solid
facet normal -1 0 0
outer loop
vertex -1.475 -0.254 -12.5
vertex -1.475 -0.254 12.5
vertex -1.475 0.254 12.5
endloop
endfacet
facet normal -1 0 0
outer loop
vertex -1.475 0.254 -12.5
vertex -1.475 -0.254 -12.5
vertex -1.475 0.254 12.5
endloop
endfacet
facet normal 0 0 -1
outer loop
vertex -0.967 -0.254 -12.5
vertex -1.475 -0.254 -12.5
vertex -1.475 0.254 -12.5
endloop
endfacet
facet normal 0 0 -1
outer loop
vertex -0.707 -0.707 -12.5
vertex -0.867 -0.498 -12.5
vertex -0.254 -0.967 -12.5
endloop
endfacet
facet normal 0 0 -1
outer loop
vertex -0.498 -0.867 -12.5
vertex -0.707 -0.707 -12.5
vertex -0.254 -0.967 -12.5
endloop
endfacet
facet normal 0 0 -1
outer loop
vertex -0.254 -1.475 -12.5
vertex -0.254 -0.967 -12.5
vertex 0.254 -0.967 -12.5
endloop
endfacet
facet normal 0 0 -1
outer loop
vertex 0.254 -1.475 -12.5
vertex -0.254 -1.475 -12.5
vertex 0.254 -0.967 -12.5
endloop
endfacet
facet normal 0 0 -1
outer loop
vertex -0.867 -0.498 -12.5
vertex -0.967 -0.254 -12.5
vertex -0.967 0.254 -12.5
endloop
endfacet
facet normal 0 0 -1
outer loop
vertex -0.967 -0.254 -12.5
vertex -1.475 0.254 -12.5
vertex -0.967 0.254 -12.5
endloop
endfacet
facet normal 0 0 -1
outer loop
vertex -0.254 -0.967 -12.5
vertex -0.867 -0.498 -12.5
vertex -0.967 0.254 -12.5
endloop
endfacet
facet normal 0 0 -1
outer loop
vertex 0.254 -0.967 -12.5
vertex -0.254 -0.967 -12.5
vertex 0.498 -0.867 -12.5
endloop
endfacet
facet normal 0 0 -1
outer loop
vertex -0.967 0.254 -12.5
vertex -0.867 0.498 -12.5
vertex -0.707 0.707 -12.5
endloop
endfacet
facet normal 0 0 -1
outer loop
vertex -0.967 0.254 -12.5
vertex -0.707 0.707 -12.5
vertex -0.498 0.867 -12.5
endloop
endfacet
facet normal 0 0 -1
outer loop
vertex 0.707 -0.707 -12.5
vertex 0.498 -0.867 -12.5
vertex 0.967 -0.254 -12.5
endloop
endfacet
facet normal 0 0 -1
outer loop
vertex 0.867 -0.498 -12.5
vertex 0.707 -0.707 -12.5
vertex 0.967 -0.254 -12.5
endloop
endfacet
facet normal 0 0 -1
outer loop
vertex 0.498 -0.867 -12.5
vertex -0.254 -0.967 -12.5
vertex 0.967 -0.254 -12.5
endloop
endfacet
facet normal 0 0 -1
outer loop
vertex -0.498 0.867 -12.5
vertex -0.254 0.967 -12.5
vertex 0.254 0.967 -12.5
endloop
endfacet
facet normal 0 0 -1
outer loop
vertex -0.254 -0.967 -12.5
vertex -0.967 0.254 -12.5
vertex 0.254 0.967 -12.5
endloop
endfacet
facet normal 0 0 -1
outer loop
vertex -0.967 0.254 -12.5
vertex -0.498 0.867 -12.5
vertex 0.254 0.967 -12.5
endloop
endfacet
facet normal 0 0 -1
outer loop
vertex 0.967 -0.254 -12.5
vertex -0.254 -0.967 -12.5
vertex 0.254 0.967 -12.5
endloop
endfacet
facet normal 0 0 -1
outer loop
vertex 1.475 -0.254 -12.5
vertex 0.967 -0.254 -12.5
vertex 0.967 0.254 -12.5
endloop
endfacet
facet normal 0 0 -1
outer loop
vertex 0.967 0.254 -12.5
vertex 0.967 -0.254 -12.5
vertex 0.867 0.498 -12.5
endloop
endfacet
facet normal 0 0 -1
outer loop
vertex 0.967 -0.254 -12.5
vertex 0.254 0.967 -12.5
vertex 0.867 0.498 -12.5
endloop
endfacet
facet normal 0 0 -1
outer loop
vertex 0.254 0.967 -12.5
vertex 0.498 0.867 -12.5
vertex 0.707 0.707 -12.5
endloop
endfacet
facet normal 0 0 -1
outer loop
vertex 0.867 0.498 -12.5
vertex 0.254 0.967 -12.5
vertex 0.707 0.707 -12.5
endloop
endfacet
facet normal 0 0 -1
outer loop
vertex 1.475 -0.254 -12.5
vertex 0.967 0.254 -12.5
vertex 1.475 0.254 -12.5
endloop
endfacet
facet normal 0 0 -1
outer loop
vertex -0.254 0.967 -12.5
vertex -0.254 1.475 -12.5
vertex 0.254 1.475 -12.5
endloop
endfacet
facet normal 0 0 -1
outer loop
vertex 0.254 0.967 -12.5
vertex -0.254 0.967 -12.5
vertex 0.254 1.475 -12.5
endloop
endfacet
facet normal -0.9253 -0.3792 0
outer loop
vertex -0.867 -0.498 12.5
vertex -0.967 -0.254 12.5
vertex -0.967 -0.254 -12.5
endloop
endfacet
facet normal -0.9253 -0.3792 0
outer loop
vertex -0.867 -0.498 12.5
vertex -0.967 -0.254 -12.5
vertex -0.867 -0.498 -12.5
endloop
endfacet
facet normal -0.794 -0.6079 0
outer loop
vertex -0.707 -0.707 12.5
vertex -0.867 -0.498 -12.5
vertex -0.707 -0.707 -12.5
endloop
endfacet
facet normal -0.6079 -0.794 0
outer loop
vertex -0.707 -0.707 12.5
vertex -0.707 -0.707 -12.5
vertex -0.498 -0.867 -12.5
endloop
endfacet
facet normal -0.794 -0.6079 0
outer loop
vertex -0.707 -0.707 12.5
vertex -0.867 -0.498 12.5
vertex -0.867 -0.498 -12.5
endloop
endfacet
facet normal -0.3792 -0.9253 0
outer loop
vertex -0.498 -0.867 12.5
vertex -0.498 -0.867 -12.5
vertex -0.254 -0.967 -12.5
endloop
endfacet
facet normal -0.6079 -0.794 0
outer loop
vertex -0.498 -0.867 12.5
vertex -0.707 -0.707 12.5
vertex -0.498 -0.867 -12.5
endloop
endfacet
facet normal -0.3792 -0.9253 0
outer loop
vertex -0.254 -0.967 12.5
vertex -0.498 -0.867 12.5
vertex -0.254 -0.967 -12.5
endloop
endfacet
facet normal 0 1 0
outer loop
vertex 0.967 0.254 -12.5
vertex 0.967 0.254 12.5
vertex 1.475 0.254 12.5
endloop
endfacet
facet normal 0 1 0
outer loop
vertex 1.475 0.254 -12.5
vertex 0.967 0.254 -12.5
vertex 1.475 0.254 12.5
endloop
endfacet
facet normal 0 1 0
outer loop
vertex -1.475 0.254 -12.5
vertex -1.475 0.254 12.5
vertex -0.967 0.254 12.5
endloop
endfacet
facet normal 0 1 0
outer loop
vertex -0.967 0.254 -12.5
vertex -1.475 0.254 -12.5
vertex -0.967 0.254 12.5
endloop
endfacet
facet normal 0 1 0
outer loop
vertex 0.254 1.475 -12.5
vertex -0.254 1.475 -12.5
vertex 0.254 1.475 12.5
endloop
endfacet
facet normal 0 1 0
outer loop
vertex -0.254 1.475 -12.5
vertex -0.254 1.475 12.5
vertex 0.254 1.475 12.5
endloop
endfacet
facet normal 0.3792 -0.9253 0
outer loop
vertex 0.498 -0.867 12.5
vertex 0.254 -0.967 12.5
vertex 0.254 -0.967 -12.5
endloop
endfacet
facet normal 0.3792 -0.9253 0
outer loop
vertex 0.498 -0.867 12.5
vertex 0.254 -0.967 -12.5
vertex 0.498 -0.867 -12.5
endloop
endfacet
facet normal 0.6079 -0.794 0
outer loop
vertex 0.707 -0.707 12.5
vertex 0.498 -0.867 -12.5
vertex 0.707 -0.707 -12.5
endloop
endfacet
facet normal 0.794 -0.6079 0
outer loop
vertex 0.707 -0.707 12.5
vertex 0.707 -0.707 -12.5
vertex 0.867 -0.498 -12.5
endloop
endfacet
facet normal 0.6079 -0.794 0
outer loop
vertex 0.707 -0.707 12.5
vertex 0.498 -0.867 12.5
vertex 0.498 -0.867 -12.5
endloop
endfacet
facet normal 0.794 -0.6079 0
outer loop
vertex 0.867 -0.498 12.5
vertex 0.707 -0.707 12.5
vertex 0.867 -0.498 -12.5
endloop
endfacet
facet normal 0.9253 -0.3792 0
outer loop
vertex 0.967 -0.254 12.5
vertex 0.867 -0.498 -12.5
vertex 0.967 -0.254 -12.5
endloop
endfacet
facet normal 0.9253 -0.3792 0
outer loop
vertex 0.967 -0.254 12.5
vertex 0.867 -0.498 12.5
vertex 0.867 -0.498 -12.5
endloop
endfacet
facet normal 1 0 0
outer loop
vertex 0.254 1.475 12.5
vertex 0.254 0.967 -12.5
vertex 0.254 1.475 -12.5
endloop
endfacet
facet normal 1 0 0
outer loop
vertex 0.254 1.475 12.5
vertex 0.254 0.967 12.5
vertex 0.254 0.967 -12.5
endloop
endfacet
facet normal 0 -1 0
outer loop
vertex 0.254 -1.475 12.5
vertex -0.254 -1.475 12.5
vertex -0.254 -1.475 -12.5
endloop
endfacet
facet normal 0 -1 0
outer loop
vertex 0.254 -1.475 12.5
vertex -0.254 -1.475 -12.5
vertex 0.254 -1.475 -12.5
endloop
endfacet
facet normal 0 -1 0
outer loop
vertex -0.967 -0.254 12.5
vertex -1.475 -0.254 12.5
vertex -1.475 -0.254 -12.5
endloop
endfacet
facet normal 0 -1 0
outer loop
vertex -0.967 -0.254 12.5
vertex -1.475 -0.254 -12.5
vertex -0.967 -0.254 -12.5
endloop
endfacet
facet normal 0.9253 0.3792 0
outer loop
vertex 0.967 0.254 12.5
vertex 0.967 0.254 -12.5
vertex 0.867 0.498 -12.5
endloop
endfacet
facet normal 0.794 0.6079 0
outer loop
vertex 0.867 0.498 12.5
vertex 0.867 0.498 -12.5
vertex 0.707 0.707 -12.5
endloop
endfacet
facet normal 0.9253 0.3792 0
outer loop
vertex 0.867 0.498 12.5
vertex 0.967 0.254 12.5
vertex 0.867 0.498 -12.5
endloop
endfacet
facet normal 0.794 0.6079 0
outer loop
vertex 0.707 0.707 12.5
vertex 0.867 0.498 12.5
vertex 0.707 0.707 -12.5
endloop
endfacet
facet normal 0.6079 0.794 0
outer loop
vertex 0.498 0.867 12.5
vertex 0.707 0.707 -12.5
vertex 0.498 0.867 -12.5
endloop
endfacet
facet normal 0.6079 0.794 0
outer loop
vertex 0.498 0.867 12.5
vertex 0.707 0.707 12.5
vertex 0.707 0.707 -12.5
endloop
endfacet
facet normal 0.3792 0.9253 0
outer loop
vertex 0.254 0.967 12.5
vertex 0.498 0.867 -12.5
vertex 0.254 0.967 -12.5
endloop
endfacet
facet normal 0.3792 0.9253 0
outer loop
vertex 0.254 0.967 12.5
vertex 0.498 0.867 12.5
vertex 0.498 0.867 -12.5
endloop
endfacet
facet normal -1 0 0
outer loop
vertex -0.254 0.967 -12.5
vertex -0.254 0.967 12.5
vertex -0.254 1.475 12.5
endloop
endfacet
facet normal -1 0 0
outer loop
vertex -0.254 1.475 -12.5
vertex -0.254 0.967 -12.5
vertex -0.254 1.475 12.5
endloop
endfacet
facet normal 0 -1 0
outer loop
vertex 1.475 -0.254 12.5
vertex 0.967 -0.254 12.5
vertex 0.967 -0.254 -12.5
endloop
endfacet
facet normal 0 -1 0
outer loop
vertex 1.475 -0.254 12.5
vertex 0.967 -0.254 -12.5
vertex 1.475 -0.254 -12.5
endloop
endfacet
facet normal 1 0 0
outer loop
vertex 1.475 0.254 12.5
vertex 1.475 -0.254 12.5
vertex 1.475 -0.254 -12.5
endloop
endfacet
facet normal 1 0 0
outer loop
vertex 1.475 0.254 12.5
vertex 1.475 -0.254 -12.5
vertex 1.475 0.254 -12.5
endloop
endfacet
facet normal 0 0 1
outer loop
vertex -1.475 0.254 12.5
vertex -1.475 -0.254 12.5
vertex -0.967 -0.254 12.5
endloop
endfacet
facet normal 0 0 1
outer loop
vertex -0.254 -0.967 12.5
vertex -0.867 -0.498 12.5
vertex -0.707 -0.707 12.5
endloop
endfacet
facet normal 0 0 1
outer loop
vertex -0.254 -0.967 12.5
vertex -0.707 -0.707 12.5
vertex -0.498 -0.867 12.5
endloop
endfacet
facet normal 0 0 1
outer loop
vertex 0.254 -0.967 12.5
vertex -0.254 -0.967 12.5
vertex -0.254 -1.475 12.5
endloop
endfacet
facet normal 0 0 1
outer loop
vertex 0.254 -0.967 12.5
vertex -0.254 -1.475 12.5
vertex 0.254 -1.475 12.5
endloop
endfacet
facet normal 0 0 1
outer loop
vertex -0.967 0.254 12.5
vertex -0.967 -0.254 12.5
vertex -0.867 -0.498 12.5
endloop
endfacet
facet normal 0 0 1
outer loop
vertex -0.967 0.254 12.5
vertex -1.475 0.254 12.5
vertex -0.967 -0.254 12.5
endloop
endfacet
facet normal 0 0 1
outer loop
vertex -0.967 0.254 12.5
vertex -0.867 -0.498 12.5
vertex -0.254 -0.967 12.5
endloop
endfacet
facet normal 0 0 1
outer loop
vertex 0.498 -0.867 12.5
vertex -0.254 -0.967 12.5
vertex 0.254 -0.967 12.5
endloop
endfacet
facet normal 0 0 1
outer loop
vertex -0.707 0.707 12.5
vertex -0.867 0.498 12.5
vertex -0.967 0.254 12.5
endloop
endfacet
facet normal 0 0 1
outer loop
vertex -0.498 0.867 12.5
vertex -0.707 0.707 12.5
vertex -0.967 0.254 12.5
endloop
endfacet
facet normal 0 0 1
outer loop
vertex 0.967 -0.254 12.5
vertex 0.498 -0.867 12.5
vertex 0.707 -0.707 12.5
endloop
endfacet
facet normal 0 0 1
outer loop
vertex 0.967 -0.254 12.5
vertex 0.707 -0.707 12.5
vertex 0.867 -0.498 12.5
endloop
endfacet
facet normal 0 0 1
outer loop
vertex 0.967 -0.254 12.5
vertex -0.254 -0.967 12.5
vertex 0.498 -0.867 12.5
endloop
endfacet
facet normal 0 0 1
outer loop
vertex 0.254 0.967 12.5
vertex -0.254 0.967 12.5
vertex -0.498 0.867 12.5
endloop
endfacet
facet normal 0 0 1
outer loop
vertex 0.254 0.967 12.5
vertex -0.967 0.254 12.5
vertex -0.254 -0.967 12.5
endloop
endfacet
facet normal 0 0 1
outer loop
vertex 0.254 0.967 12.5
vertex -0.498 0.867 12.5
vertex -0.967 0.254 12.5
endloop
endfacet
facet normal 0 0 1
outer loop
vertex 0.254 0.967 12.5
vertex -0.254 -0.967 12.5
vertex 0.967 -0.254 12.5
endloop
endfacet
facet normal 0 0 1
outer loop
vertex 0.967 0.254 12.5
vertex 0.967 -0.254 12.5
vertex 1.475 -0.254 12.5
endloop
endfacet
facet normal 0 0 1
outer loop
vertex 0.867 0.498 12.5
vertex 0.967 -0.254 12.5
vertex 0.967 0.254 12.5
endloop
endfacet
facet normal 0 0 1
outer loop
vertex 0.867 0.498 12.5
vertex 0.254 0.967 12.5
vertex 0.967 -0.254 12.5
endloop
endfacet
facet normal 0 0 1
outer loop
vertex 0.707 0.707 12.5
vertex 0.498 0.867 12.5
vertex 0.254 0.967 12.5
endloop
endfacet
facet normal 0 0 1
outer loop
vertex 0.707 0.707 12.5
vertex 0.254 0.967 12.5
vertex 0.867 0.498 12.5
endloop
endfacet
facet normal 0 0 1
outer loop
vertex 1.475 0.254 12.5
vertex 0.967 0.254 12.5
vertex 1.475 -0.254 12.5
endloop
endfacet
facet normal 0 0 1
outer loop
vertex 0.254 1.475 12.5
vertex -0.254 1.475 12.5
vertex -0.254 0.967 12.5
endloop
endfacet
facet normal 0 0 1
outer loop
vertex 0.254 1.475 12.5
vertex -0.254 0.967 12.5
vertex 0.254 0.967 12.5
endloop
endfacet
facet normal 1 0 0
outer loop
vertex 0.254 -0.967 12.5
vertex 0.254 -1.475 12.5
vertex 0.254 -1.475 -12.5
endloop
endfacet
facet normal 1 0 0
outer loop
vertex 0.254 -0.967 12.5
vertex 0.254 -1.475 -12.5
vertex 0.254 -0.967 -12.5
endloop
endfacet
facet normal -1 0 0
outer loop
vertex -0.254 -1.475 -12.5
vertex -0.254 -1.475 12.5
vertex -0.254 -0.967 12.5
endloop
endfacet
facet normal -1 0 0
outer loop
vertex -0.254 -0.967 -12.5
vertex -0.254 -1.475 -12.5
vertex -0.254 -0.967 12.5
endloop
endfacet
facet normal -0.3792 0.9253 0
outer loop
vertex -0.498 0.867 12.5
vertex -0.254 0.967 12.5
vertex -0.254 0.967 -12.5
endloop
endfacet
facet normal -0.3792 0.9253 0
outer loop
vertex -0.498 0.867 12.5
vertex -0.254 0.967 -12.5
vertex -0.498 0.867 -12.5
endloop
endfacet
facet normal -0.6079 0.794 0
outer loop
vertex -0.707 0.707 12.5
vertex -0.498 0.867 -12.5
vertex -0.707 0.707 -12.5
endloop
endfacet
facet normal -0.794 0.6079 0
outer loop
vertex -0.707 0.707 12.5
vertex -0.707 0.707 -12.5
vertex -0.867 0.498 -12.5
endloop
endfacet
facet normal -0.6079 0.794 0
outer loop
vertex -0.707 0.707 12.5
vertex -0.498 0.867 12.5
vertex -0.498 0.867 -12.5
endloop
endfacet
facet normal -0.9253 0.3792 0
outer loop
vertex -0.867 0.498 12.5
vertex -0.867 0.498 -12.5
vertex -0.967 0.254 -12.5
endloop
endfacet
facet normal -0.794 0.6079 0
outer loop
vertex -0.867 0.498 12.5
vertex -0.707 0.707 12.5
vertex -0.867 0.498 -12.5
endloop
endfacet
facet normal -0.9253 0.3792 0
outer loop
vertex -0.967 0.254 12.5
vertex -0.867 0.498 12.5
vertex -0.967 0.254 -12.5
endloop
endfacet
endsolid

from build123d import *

# Parameters (mm, degrees)
SKETCH1_R           = 1
SKETCH1_W           = 0.508
SKETCH1_H           = 0.508
BOSS_EXTRUDE1_DEPTH = 12.5


with BuildPart() as part:
    # Sketch1 → Boss-Extrude1 (new, symmetric)
    with BuildSketch(Plane.XY):
        Circle(SKETCH1_R)
        with Locations((0, 1.221204218)):
            Rectangle(SKETCH1_W, SKETCH1_H)
        with Locations((0, -1.221204218)):
            Rectangle(SKETCH1_W, SKETCH1_H)
        with Locations((1.221204218, 0)):
            Rectangle(SKETCH1_W, SKETCH1_H)
        with Locations((-1.221204218, 0)):
            Rectangle(SKETCH1_W, SKETCH1_H)
    extrude(amount=BOSS_EXTRUDE1_DEPTH, both=True)


solid = part.part
